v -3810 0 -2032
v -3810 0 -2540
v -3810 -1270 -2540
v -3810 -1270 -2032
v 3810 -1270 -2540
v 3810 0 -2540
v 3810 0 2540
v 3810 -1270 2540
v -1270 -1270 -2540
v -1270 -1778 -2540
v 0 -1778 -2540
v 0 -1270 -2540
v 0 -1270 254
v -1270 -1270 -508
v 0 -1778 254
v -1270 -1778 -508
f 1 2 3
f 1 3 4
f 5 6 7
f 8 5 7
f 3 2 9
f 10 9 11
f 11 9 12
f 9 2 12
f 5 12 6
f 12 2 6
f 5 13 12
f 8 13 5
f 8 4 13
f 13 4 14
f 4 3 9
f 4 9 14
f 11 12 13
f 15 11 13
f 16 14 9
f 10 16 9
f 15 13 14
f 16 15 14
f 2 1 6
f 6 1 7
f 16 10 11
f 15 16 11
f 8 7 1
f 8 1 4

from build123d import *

# Parameters (mm, degrees)
F0_W     = 7620
F0_H     = 5080
F1_DEPTH = 1270
F2_SIZE2 = 7619.99999
F2_SIZE  = 4571.99999
F4_DEPTH = 508


# Not quite as in the source:
# - a fillet or chamfer is up to 0.001 mm smaller than in the source, because OpenCascade refuses the exact size
# - ends of sketch curves that miss each other by under 0.0002 mm in the source are joined


with BuildPart() as f1:
    # F0 (on Front) → F1 (new body)
    with BuildSketch(Plane.XZ):
        Rectangle(F0_W, F0_H)
    extrude(amount=F1_DEPTH)

    # F2 (size 4572 and 7620 in the source; OpenCascade refuses exactly that, so slightly less here)
    f2_edges = [f1.edges().sort_by_distance(p)[0] for p in [
        (-3810, -635, 2540),
    ]]
    f2_side = f1.faces().sort_by_distance((-3810, -635, 0))[0]
    chamfer(f2_edges, length=F2_SIZE, length2=F2_SIZE2, reference=f2_side)

    # F3 (on face) → F4 (join)
    with BuildSketch(Plane.XZ.offset(1270)):
        Polygon((-1270, -508), (-1270, -2540), (0, -2540), (0, 254), align=None)
    extrude(amount=F4_DEPTH)


solid = f1.part
